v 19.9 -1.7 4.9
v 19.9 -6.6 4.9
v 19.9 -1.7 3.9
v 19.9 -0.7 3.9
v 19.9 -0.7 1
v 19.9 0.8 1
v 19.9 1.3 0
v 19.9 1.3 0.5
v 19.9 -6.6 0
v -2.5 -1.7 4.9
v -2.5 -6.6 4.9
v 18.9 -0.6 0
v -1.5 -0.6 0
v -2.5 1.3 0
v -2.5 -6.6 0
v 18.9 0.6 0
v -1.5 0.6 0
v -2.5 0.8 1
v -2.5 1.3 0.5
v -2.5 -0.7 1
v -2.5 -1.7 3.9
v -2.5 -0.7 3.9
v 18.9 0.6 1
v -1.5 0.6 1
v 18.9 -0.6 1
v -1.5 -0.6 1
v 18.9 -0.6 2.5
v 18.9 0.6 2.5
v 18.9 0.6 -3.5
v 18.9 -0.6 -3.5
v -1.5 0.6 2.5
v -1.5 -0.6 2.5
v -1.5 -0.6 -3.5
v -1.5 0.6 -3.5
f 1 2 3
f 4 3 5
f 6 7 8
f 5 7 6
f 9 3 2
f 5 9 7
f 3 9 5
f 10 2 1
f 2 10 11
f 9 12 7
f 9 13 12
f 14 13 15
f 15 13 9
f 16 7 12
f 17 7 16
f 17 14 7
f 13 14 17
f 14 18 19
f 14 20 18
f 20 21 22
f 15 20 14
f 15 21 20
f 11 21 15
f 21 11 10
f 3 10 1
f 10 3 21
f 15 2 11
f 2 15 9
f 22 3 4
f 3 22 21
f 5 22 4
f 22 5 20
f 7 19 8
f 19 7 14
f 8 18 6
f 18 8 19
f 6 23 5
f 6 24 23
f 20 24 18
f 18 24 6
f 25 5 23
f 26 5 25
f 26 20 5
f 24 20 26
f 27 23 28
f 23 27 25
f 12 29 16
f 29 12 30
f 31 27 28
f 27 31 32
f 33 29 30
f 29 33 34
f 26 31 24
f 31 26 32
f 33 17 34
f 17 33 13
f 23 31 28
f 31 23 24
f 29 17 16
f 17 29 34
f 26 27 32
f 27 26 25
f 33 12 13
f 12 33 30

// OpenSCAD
translate([-2.5,-6.6,0])
{
	cube([22.4,4.9,4.9]);
	cube([22.4,5.9,3.9]);
	hull()
	{
		cube([22.4,7.4,1]);
		cube([22.4,7.9,0.5]);
	}
	translate([1,6,-3.5])cube([20.4,1.2,6]);
}
